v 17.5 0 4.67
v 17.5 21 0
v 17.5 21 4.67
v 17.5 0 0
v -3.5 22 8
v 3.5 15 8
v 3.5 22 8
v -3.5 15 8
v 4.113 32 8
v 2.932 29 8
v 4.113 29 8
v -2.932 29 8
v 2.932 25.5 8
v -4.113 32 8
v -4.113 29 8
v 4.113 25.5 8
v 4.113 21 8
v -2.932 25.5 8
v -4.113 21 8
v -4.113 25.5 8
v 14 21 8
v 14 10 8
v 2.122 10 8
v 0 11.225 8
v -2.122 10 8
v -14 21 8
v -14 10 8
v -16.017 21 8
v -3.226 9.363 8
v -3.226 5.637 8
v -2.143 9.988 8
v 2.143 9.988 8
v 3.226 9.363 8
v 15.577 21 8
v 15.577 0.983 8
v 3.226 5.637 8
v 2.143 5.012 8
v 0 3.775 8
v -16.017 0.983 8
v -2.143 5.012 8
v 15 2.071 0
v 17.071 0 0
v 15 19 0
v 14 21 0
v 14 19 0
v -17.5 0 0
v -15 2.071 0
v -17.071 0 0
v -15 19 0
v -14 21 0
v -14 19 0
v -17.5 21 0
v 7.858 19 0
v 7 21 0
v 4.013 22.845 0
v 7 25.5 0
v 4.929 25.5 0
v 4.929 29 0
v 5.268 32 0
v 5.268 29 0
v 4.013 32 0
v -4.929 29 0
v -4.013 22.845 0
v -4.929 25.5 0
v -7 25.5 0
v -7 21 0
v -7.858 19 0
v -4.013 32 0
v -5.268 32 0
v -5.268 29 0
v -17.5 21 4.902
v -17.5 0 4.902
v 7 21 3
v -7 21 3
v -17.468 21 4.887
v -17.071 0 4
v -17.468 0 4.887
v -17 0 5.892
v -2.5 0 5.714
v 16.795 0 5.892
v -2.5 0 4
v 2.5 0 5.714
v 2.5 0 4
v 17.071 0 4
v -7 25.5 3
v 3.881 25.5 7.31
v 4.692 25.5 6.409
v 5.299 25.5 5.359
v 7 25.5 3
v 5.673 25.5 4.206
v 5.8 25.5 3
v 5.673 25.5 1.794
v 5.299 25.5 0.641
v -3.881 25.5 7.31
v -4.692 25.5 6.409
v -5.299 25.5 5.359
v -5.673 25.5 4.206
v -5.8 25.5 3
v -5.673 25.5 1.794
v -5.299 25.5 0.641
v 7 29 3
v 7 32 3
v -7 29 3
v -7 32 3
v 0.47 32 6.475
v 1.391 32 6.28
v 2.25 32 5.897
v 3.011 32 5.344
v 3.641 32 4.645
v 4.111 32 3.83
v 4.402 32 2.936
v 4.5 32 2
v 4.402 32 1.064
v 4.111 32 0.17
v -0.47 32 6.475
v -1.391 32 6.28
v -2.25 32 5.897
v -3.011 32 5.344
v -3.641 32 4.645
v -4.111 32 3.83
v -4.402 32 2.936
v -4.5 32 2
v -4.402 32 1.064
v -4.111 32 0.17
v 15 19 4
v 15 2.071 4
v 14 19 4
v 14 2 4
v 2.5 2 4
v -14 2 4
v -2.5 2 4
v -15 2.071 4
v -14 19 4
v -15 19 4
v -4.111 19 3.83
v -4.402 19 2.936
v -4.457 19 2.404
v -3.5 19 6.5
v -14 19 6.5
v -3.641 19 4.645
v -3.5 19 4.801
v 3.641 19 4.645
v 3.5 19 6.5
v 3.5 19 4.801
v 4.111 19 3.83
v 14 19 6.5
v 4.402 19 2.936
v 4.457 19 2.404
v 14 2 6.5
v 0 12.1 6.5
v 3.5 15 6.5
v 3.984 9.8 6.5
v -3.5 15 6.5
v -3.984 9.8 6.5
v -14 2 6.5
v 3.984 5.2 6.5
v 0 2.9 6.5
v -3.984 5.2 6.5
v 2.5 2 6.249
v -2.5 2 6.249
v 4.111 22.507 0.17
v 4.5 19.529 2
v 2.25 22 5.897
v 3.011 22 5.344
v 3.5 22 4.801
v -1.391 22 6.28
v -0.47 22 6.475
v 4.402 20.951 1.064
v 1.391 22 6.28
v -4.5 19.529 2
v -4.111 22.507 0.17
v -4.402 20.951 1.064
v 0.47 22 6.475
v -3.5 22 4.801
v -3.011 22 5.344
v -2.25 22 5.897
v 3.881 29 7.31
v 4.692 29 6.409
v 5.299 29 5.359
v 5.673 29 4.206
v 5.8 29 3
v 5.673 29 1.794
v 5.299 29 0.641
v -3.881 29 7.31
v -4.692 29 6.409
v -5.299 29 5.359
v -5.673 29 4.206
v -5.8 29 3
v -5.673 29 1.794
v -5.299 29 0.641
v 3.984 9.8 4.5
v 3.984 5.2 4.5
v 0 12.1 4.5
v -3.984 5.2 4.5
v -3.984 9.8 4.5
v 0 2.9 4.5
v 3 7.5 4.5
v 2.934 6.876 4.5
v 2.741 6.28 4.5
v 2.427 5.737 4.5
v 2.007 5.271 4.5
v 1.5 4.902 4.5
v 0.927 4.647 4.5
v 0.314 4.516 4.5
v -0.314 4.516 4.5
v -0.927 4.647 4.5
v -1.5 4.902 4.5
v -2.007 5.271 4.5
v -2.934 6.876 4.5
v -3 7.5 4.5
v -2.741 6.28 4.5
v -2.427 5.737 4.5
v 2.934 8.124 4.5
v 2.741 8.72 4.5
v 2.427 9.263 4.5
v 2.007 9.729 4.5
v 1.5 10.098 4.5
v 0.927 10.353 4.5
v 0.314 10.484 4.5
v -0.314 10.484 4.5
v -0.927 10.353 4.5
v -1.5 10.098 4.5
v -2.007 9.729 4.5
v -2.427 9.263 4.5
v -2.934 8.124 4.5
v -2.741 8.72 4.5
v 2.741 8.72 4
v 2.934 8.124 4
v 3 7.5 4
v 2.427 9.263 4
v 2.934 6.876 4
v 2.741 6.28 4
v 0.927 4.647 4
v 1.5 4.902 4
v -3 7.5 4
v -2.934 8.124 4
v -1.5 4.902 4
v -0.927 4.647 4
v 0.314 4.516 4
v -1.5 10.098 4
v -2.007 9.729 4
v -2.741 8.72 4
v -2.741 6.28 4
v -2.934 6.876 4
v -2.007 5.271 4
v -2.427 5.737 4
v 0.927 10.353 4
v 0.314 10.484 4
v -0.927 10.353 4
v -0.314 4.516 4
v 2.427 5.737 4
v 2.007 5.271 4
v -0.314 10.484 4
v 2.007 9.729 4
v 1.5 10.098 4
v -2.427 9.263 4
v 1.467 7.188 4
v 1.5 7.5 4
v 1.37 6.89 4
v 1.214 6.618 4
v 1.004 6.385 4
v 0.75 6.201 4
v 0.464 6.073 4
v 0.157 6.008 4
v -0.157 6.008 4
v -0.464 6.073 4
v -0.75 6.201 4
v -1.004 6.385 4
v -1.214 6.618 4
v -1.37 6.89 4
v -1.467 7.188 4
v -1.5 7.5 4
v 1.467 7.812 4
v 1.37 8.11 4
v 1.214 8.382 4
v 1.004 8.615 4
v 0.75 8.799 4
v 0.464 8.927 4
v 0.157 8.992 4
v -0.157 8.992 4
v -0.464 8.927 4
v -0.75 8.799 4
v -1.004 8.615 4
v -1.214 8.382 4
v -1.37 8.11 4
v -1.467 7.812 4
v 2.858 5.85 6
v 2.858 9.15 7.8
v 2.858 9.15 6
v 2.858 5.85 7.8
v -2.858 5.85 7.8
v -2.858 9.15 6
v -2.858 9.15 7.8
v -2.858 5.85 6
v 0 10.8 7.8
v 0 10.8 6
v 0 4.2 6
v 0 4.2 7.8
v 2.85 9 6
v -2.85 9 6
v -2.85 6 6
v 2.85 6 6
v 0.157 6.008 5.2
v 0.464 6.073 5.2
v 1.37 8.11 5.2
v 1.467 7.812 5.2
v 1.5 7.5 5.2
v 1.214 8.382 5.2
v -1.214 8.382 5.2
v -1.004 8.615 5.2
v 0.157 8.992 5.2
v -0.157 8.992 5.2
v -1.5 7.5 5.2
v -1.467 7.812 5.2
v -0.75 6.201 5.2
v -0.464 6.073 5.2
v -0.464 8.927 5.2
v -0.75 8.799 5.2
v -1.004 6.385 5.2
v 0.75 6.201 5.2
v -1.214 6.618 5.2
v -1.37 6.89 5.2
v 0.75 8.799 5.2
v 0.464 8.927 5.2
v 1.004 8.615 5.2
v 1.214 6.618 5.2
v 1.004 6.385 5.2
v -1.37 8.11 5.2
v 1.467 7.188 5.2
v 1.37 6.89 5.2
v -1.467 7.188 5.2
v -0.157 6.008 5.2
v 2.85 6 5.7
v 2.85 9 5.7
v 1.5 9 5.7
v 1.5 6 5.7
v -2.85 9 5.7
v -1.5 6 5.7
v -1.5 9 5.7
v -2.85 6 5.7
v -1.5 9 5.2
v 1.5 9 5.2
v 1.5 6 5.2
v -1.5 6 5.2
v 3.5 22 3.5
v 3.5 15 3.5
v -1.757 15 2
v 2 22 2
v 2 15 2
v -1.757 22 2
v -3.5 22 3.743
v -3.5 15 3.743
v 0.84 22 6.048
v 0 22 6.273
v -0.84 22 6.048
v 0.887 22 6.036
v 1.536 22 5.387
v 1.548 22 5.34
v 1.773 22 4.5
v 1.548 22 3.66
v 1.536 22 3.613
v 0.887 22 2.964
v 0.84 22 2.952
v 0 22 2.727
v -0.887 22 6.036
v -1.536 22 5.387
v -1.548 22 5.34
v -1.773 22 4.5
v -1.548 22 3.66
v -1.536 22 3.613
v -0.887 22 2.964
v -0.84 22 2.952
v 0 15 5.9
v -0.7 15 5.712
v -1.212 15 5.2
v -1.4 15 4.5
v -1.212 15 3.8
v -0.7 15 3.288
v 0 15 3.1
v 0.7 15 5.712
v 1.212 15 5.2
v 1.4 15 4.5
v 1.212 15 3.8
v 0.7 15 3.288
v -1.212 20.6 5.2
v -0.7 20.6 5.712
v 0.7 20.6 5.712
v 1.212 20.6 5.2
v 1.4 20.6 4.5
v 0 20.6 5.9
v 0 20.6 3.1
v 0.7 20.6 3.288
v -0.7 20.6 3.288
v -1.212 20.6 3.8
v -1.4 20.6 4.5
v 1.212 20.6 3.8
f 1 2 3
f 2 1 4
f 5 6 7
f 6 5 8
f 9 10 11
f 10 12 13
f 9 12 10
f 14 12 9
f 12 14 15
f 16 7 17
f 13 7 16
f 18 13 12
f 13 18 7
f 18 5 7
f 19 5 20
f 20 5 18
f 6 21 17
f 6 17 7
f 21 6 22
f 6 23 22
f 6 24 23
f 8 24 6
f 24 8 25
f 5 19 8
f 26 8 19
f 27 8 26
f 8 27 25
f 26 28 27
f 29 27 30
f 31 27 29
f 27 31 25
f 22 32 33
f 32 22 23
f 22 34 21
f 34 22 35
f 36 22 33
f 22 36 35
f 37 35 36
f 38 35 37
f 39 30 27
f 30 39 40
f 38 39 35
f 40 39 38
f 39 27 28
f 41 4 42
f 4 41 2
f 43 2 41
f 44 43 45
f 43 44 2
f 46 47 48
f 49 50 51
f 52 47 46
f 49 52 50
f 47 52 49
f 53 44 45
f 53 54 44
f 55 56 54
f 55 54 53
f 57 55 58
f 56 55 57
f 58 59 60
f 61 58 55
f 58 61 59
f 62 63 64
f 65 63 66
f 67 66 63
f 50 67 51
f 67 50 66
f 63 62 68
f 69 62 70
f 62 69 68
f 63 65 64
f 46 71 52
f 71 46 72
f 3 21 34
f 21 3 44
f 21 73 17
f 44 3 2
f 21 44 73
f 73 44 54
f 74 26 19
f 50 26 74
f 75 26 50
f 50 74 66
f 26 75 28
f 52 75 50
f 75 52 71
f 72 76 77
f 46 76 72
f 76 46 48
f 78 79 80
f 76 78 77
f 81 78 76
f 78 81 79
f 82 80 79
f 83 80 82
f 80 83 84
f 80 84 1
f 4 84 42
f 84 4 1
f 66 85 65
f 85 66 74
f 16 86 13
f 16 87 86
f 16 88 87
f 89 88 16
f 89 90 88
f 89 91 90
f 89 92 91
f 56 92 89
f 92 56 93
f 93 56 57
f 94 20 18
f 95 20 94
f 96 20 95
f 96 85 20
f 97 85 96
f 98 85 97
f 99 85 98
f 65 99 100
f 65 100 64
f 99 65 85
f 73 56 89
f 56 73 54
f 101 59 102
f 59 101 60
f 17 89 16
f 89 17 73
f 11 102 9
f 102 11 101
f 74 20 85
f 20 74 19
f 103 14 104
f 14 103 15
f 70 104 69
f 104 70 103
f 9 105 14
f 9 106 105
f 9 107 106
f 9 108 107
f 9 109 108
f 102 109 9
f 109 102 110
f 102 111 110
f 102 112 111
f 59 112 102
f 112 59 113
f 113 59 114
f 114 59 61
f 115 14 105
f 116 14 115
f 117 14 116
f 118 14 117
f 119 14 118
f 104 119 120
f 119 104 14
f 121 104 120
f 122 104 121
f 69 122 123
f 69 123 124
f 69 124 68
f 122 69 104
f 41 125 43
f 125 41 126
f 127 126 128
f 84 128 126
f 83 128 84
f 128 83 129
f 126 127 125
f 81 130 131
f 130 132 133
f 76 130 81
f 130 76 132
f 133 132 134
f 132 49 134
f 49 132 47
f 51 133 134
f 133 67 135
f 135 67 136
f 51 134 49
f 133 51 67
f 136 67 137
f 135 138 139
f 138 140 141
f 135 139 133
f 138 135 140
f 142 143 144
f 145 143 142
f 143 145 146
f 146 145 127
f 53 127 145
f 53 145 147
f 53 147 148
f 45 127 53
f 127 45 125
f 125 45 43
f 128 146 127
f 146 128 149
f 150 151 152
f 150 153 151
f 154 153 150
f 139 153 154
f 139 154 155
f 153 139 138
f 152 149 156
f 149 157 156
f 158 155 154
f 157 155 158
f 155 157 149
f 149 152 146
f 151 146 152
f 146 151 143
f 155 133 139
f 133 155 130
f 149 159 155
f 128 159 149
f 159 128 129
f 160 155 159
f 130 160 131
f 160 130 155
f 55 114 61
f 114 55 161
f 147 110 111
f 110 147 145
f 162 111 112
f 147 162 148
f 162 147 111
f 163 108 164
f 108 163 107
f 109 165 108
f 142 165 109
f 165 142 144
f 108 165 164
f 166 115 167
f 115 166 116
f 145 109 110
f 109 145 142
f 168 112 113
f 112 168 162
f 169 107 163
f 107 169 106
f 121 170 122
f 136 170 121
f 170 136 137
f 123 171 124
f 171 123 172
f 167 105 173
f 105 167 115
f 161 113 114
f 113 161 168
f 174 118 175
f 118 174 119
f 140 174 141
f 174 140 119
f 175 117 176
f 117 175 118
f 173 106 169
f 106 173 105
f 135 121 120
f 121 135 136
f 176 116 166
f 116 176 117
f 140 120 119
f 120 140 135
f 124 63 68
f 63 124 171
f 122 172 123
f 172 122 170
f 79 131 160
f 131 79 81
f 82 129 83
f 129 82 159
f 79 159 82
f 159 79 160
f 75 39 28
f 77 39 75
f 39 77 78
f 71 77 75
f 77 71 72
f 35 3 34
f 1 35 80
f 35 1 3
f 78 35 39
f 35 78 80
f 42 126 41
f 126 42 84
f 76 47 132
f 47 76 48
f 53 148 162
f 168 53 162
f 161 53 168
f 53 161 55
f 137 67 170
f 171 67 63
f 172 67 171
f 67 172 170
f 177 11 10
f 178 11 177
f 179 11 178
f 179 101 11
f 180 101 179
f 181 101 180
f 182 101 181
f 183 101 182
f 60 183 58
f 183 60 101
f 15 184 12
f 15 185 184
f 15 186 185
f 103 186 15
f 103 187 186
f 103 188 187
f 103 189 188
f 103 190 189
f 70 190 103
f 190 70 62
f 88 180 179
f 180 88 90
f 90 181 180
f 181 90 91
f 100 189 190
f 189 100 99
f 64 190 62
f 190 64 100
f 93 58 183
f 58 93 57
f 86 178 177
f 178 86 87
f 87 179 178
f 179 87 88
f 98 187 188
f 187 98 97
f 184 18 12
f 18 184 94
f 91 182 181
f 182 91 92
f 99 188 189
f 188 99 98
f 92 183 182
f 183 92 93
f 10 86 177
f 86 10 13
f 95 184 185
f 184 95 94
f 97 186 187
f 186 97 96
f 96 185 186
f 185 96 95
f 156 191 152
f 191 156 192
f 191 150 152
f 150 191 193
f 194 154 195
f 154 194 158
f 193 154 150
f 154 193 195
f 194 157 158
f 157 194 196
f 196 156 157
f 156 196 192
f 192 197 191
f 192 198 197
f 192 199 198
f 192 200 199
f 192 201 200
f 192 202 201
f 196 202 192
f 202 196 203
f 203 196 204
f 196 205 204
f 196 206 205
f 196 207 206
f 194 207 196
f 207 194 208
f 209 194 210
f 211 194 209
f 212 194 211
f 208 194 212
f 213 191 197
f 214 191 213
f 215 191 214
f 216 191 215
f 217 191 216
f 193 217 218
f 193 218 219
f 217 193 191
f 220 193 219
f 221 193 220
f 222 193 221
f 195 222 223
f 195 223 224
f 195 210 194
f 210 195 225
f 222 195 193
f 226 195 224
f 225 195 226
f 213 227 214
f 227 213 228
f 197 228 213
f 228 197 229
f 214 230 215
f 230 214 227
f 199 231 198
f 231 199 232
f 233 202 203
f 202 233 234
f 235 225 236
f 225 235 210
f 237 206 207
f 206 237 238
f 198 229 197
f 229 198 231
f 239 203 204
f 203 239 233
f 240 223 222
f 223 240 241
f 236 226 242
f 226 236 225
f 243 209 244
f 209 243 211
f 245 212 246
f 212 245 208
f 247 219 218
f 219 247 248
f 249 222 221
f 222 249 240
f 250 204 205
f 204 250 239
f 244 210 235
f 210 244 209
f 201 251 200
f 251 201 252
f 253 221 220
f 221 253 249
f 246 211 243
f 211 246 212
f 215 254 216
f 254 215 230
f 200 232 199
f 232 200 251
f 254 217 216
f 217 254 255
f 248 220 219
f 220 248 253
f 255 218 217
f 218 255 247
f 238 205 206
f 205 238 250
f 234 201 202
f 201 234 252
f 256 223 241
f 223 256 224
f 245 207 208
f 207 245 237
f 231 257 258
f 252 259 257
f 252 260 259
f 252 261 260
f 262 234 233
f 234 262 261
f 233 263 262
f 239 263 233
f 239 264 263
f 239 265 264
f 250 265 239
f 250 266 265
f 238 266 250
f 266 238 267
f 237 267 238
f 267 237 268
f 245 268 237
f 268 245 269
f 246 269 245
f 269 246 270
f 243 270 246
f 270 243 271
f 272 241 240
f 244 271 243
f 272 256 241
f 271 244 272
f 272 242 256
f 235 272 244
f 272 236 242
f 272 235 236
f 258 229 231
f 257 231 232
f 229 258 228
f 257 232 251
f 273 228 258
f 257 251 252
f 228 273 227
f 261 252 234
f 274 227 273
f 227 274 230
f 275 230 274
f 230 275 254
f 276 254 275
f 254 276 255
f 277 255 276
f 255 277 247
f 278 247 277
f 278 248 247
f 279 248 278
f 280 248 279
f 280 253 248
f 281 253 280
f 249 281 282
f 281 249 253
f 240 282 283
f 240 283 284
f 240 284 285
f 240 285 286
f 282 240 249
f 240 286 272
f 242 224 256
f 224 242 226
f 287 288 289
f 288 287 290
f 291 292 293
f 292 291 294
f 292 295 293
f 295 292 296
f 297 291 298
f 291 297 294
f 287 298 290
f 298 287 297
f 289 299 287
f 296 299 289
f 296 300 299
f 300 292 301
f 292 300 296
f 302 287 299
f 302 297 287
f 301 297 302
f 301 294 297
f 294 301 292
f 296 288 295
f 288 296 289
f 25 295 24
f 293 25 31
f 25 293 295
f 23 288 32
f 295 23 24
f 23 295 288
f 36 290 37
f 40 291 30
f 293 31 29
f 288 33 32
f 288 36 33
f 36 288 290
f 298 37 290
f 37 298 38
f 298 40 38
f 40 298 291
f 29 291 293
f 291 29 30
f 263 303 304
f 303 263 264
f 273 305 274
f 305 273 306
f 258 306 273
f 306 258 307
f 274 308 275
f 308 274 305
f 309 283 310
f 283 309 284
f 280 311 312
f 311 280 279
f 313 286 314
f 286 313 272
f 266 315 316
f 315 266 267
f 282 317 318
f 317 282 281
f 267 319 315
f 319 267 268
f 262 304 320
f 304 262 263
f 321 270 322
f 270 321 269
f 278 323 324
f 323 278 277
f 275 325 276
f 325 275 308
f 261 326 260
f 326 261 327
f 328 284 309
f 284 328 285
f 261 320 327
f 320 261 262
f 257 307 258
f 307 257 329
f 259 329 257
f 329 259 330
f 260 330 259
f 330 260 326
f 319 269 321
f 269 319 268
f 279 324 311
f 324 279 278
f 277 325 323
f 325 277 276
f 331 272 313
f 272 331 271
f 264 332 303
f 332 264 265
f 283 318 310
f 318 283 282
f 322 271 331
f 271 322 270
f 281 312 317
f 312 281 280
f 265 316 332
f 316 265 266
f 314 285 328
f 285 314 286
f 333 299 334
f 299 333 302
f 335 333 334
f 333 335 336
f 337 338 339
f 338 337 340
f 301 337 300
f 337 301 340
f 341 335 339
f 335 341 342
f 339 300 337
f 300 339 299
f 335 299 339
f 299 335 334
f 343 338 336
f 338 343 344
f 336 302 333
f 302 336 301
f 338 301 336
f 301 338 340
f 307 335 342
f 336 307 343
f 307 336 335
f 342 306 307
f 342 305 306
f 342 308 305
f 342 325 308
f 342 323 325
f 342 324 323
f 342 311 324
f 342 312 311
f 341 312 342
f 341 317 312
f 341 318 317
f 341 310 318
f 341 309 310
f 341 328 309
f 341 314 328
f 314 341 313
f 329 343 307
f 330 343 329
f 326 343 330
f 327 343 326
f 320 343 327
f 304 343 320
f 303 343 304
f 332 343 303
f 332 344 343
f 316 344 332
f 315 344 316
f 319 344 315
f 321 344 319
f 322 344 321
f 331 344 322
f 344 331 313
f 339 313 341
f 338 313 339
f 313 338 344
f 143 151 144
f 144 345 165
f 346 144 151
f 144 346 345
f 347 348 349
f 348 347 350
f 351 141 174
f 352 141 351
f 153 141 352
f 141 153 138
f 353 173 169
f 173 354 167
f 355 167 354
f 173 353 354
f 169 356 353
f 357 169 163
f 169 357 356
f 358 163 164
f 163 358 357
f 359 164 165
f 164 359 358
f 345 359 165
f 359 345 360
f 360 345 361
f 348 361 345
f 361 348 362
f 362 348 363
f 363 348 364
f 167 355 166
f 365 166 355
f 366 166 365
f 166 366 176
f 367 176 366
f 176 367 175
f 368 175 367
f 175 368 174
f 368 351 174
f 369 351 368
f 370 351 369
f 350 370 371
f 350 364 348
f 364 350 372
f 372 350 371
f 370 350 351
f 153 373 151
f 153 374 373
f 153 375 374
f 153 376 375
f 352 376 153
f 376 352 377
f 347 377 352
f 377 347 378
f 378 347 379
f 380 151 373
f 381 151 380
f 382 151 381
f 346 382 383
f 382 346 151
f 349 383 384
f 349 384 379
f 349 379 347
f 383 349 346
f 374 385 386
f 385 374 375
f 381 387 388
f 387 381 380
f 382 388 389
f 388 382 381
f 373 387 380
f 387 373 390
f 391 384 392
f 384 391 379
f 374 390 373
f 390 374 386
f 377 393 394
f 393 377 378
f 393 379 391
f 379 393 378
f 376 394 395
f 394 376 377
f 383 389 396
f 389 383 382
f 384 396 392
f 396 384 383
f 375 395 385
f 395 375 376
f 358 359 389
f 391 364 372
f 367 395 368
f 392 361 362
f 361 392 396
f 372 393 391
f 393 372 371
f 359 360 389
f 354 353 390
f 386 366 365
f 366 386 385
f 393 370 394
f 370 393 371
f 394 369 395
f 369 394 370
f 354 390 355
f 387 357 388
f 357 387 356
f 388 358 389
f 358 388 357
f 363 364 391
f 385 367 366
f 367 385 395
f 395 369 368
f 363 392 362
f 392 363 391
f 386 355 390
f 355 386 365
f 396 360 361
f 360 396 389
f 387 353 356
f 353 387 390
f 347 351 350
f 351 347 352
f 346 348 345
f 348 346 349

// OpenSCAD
// PRUSA iteration3
// Heatbed cable cover
// GNU GPL v3
// Josef Průša <iam@josefprusa.cz> and contributors
// http://www.reprap.org/wiki/Prusa_Mendel
// http://prusamendel.org


module cover()
{
    translate([ -17.5, 0, 0 ]) cube([ 35, 21, 8 ]);  // cover
    translate([ -7, 19, 0 ]) cube([ 3, 6.5, 3 ]);  // tube reinforcement
    translate([ 4, 19, 0 ]) cube([ 3, 6.5, 3 ]);  // tube reinforcement
    translate( [ 0 , 32 , 3 ] ) rotate( [90,0,0] ) cylinder( h = 12, r = 7, $fn=6);  // cable tube outer
}

module inside_cut(){
    translate([ -15, -1, -1 ]) cube( [30,20,5] );     // inside cut
    translate([ -14, 2, 4 ])  cube( [28,17,2.5 ] );     // inside cut
    
    translate( [ 0 , 32 , 2 ] ) rotate( [90,0,0] ) cylinder( h = 16, r = 4.5, $fn=30);  // cable tube inner
    
    translate([ -14, 10, -5 ])  cube( [28,25,5 ] );     // inside cut
    translate([ -14, 10, 8 ])  cube( [28,25,3 ] );     // inside cut
    
    translate([ -2.5, -6, 1 ])  rotate([15,0,0]) cube( [5,10,3 ] );     // LED
    
    translate([ -22, -5, 7 ]) rotate([0,25,0])  cube( [5,40,6 ] );     // corners
    translate([ 15, -5, 9 ]) rotate([0,60,0])  cube( [6,40,5 ] );     // corners
    translate([ 20, -5, 7 ]) rotate([0,25,90])  cube( [5,40,5 ] );     // corners
    
    translate([ 15, -5, -1 ]) rotate([0,0,45])  cube( [5,5,5 ] );     // corners
    translate([ -15, -5, -1 ]) rotate([0,0,45])  cube( [5,5,5 ] );     // corners
    
    
    translate([ 8, 13, -10]) rotate([0,-45,45])  cube( [10,10,10 ] );     // corners
    translate([ -8, 13, -10]) rotate([0,-45,-45])  cube( [10,10,10 ] );     // corners

    }

    module ziptie(){
        difference(){
        translate( [ 0 , 29 , 3 ] ) rotate( [90,0,0] ) cylinder( h = 3.5, r = 10, $fn=30);  // cable tube outer
        translate( [ 0 , 29 , 3 ] ) rotate( [90,0,0] ) cylinder( h = 3.5, r = 5.8, $fn=30);  // cable tube outer
        }
        }

    module filament_holder(){
        difference(){
        #translate([ -3.5,15, 2 ]) rotate([0,0,0])  cube( [7,7,6 ] );     // body ; previous translate([ -2.5,15, 2 ]) cube( [5,7,6 ] );
        translate( [ 0 , 24 , 4.5 ] ) rotate( [90,0,0] ) cylinder( h = 10, r = 1.4, $fn=12);  // filament
        translate( [ 0 , 22.1 , 4.5 ] ) rotate( [90,0,0] ) cylinder( h = 1.5, r1 = 1.8, r2=1.4, $fn=12);  // filament

        #translate([ -6,15, 2 ]) rotate([0,45,0])  cube( [4,15,3 ] );     // corners ; previous ([ -5,15, 1 ]) cube( [3,15,3 ] )           
        #translate([ 1,15, 1 ]) rotate([0,45,0])  cube( [3,15,4 ] );     // corners ; previous  cube( [3,15,3 ] ) 
        }
    }
    module m3_screw(){
        
    translate( [ 0 , 7.5 , 6 ] ) rotate( [0,0,90] ) cylinder( h = 2.5, r = 3.3, $fn=6);  // M3 HEAD
    translate( [ 0 , 7.5 , 7.8] ) rotate( [0,0,90] ) cylinder( h = 0.8, r1 = 3.3, r2=5, $fn=6);  // M3 HEAD
    translate( [ 0 , 7.5 , -10 ] ) rotate( [0,0,0] ) cylinder( h = 20, r = 1.5, $fn=30);  // M3 thread
    }
    
    module nut_trap(){
    translate( [ 0 , 7.5 , 4.5 ] ) rotate( [0,0,90] ) cylinder( h = 2.5, r = 4.6, $fn=6);  // M3 HEAD
    translate( [ 0 , 7.5 , 4 ] ) rotate( [0,0,0] ) cylinder( h = 1, r = 3, $fn=30);    
    
    }
    
    difference(){
    union(){
        difference(){
        cover();
        inside_cut();
            ziptie();
        }
        nut_trap();
    }   
    m3_screw();
      translate( [ 0 , 7.5 , 6.2 ] ) rotate( [0,0,0] ) cube( [5.7,3,1], center=true);   
    translate( [ 0 , 7.5 , 5.7 ] ) rotate( [0,0,0] ) cube( [3,3,1], center=true); 
    }
    
    filament_holder();
    
